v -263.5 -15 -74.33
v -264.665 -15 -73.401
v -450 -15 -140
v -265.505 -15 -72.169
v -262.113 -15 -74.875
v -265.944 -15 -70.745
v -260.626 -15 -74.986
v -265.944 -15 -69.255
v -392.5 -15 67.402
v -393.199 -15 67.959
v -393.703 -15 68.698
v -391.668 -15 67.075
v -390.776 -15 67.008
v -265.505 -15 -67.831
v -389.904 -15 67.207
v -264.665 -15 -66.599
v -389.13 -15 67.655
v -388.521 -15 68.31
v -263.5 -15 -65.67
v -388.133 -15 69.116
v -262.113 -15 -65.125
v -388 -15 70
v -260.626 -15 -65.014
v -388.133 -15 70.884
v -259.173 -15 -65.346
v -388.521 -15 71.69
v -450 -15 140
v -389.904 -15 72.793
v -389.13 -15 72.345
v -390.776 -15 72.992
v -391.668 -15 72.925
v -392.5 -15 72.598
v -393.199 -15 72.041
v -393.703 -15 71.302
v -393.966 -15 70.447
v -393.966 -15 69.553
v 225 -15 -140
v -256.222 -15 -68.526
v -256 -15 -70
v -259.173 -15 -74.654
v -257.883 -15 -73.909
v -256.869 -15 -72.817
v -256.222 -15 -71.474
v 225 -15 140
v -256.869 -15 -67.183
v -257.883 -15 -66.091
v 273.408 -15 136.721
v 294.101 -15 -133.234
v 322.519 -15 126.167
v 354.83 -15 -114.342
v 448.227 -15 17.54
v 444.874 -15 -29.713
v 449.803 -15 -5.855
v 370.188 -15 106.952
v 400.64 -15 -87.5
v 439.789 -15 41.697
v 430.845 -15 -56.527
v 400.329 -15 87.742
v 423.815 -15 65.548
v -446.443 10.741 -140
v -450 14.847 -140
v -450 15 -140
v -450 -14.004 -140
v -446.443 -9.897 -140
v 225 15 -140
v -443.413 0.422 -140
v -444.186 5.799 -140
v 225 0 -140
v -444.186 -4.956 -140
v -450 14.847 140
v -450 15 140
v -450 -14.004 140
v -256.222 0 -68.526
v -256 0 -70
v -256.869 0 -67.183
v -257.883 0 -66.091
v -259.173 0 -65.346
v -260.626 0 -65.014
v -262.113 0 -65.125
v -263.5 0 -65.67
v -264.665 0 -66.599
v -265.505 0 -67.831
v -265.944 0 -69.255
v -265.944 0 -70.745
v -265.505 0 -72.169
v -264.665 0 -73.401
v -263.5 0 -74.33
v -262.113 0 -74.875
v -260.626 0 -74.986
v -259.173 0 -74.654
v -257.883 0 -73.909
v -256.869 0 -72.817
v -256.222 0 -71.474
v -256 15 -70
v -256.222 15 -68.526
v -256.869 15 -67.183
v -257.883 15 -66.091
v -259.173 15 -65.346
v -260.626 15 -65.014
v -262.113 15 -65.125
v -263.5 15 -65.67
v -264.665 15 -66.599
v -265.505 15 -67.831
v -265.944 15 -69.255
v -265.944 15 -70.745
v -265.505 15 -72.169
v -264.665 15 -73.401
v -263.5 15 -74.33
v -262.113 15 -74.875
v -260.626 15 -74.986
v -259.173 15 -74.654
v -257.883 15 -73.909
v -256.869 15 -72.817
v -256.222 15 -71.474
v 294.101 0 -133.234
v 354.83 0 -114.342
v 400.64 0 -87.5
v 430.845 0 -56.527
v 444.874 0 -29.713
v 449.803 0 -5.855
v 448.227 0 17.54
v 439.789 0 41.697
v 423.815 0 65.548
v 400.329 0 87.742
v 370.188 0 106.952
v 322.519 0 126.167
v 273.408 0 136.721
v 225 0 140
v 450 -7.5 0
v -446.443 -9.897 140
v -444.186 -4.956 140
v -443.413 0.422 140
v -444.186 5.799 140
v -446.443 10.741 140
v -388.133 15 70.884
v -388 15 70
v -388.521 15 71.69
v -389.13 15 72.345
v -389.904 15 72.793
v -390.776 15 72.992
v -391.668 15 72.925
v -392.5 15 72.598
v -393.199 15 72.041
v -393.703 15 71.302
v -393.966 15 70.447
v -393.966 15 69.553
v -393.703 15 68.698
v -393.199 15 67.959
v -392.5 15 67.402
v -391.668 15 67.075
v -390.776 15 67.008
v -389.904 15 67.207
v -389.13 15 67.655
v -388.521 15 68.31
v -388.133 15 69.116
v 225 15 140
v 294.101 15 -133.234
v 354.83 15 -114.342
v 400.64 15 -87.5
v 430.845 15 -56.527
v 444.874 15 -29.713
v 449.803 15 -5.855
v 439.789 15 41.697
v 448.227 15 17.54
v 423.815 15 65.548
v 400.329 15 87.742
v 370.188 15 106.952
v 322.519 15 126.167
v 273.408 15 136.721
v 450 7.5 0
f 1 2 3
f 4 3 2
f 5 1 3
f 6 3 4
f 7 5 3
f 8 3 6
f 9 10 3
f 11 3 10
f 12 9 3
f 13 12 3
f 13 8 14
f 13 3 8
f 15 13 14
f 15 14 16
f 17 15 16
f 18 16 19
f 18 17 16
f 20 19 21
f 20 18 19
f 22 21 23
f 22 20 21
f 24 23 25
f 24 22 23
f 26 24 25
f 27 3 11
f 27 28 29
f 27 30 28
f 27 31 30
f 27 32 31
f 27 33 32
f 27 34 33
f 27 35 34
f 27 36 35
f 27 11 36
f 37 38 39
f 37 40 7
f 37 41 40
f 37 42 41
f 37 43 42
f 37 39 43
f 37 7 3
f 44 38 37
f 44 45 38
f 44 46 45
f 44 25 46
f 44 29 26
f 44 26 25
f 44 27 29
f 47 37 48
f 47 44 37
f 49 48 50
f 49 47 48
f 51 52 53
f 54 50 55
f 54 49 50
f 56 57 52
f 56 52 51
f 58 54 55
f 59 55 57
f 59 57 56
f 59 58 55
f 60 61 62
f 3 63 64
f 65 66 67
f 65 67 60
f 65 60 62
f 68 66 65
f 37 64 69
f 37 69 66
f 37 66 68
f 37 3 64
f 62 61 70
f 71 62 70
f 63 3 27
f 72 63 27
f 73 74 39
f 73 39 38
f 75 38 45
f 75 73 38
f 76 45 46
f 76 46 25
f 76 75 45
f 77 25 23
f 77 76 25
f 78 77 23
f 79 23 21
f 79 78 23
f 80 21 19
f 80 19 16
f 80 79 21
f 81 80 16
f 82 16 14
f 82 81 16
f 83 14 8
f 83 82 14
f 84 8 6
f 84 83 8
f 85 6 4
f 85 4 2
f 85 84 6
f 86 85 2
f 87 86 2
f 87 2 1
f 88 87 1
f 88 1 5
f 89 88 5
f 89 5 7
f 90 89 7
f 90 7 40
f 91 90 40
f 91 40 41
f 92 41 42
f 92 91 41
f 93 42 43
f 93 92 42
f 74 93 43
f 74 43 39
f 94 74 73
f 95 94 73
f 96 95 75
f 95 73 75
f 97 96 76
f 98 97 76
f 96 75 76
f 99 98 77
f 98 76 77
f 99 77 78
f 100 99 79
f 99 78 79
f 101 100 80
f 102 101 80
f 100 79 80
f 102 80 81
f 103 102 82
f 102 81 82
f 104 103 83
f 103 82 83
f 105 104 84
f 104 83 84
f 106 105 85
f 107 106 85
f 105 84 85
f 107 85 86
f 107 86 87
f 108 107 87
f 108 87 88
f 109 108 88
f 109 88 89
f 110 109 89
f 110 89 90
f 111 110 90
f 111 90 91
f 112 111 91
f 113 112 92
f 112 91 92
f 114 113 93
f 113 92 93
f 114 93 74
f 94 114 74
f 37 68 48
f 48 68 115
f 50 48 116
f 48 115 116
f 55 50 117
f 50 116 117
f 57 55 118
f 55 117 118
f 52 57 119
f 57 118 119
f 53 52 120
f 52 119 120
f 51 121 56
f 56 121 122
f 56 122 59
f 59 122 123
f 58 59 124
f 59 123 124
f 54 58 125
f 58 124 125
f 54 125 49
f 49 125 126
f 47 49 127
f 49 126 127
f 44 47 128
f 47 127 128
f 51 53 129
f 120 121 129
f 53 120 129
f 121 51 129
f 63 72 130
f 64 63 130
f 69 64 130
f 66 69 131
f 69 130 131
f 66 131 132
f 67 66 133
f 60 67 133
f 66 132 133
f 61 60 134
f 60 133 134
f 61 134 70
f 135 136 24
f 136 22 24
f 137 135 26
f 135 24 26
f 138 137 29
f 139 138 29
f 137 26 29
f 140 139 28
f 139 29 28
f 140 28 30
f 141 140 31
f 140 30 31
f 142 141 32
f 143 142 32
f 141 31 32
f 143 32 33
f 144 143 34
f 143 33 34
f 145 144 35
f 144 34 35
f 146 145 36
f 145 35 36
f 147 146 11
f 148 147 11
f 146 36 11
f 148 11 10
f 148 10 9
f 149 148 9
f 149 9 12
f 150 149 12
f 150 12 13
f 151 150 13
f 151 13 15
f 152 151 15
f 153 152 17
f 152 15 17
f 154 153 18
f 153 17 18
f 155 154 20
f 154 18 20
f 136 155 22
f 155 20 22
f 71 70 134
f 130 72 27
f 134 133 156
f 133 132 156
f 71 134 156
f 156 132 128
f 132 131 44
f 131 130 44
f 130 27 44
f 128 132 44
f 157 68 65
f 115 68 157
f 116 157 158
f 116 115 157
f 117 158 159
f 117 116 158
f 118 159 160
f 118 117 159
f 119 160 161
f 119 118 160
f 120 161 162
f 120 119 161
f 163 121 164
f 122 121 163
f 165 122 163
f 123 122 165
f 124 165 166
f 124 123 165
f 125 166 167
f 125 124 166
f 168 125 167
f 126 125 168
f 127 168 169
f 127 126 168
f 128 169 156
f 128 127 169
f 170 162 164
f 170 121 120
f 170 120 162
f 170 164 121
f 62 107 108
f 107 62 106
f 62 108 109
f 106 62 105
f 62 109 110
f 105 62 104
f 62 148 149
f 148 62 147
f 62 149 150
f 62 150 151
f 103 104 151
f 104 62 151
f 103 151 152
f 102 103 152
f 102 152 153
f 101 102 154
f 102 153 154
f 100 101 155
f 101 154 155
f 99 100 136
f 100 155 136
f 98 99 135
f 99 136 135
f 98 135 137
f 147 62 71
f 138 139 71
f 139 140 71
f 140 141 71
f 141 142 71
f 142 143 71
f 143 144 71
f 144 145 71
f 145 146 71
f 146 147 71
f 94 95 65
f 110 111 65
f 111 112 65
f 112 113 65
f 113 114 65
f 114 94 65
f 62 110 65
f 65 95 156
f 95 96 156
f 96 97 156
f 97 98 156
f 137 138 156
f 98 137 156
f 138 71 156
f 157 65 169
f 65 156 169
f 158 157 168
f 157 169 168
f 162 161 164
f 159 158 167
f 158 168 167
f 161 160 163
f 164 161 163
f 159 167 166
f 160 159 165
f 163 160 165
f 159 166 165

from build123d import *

# Parameters (mm, degrees)
F0_W     = 675
F0_H     = 280
F1_DEPTH = 15
F2_R     = 5
F2_R_2   = 3
F3_DEPTH = 15
F4_R     = 19.0898423248
F5_DEPTH = 140


with BuildPart() as f1:
    # F0 (on Front) → F1 (new body, symmetric)
    with BuildSketch(Plane.XZ):
        with BuildLine():
            Line((225, 140), (225, -140))
            add(Edge.make_bspline(
                [(225, -140), (450, -140), (450, 0), (450, 140), (225, 140)],
                knots=[4.7123889804, 4.7123889804, 4.7123889804, 6.2831853072, 6.2831853072, 7.853981634, 7.853981634, 7.853981634], degree=2, weights=[1, 0.7071067812, 1, 0.7071067812, 1]))
        make_face()
        with Locations((-112.5, 0)):
            Rectangle(F0_W, F0_H)
    extrude(amount=F1_DEPTH, both=True)

    # F2 (on Front) → F3 (cut, symmetric)
    with BuildSketch(Plane.XZ):
        with Locations((-261, -70)):
            Circle(F2_R)
        with Locations((-391, 70)):
            Circle(F2_R_2)
    extrude(amount=F3_DEPTH, both=True, mode=Mode.SUBTRACT)

    # F4 (on Top) → F5 (cut, symmetric)
    with BuildSketch(Plane.XY):
        with Locations((-462.5031328228, 0.4218905233)):
            Circle(F4_R)
    extrude(amount=F5_DEPTH, both=True, mode=Mode.SUBTRACT)


solid = f1.part
